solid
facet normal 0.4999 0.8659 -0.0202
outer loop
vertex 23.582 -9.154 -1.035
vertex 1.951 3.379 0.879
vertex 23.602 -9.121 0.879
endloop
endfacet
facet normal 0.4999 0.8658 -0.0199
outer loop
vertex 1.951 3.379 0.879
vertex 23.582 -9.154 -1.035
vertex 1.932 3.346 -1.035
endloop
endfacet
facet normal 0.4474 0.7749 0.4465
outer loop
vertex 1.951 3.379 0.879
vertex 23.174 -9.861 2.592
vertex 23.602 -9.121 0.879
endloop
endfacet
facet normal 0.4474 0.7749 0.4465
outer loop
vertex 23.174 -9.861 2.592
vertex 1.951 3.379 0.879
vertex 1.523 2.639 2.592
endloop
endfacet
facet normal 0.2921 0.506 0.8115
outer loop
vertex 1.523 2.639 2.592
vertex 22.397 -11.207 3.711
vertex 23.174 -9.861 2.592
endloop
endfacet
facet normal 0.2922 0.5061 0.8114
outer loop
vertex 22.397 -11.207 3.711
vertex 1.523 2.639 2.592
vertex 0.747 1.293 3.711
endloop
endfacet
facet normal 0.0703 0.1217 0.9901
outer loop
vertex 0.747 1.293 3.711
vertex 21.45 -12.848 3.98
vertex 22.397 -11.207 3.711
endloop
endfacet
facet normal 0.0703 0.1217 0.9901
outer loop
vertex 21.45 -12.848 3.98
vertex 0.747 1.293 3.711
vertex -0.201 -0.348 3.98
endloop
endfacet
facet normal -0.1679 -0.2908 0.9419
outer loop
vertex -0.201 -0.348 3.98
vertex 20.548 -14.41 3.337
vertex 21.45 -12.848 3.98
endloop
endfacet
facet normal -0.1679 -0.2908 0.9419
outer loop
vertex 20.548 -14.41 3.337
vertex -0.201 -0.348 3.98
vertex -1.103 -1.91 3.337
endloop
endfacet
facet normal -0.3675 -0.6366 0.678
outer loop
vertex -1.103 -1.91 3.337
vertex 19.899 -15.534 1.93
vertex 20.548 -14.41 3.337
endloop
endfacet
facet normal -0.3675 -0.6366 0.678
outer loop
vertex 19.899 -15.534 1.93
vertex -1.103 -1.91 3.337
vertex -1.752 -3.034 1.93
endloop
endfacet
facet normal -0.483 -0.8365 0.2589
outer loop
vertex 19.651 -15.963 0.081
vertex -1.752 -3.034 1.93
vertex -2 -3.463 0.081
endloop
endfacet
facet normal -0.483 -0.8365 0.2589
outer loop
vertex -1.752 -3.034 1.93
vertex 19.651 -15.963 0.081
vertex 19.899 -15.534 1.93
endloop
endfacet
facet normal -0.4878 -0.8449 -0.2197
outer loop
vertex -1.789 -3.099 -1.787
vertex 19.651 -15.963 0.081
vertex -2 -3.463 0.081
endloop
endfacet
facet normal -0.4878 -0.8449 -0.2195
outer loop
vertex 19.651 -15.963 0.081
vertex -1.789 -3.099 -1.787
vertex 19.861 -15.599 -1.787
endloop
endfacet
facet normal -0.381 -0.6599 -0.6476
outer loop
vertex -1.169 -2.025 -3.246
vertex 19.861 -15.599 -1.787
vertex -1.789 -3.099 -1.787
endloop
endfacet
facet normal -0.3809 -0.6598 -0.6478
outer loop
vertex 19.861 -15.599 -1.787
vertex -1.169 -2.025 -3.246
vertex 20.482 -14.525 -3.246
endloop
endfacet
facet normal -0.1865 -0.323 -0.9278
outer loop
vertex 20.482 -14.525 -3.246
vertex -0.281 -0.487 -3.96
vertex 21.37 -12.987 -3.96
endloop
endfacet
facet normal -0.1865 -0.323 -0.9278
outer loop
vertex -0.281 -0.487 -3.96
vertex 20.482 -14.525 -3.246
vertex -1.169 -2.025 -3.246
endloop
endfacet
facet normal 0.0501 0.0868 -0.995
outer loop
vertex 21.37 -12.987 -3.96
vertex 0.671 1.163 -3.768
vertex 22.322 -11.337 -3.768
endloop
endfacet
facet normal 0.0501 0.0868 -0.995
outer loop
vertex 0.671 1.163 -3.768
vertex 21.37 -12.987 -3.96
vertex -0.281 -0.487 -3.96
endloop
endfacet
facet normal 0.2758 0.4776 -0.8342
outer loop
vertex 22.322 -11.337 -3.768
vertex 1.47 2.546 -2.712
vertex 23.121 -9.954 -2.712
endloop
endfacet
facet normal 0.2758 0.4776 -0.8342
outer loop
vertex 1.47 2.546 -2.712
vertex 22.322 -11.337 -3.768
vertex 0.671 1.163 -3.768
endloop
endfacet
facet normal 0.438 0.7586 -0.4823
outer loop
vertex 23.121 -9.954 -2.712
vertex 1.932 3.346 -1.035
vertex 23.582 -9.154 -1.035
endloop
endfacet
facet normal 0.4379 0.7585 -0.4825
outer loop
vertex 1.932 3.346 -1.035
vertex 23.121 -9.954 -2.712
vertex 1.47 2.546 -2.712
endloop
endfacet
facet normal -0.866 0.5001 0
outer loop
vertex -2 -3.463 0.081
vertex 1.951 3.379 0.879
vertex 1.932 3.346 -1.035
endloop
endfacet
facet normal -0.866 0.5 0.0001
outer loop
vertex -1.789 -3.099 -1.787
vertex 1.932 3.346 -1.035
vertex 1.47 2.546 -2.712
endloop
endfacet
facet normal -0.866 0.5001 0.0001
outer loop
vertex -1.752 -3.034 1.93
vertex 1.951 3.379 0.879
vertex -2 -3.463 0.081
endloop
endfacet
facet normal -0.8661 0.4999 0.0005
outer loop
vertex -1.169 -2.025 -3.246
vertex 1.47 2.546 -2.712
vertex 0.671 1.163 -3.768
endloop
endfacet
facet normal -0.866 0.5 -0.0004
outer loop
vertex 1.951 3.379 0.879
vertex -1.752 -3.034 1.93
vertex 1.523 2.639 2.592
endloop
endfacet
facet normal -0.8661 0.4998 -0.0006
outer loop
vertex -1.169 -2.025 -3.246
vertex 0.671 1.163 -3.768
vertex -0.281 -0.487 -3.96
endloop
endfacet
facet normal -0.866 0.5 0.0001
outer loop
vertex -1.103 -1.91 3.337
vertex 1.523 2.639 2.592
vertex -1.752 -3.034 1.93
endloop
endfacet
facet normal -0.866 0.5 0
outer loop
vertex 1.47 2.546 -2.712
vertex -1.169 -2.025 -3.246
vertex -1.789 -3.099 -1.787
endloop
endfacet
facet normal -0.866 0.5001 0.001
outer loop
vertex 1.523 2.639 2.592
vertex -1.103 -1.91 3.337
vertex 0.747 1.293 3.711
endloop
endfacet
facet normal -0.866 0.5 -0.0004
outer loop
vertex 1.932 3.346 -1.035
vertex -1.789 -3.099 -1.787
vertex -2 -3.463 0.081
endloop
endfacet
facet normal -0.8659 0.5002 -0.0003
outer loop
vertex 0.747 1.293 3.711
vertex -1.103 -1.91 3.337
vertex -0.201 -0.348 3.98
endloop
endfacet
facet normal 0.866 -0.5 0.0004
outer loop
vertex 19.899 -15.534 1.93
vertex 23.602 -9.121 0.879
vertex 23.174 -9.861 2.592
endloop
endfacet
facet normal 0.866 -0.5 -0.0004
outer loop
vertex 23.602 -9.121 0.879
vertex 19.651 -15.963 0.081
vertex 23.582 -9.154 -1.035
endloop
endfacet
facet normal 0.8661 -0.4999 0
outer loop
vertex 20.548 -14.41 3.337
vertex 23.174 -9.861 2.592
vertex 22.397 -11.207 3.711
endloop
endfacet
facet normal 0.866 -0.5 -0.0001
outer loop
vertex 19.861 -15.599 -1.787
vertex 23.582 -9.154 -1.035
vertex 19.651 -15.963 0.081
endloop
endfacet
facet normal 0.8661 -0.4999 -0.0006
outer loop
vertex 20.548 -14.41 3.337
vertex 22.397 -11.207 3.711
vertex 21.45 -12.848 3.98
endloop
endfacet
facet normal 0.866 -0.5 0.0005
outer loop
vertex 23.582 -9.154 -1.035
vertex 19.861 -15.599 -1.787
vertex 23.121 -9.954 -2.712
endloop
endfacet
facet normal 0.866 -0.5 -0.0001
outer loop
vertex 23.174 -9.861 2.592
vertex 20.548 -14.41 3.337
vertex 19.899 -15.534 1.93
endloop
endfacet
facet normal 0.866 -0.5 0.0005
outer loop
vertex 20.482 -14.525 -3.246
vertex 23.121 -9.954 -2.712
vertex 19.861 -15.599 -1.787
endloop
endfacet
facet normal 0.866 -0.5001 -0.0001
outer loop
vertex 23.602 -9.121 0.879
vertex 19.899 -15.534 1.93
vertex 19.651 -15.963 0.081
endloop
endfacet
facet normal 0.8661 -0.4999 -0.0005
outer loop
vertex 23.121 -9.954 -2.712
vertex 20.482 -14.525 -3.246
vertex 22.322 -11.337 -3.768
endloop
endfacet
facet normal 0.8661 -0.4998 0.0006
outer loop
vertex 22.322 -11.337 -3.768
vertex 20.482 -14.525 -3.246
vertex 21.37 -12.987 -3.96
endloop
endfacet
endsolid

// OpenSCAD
// Generated by generate_scads.py
rotate([90,15,60]) {
  intersection() {
    cylinder(h=25, r=4, center=false);
  }
}
